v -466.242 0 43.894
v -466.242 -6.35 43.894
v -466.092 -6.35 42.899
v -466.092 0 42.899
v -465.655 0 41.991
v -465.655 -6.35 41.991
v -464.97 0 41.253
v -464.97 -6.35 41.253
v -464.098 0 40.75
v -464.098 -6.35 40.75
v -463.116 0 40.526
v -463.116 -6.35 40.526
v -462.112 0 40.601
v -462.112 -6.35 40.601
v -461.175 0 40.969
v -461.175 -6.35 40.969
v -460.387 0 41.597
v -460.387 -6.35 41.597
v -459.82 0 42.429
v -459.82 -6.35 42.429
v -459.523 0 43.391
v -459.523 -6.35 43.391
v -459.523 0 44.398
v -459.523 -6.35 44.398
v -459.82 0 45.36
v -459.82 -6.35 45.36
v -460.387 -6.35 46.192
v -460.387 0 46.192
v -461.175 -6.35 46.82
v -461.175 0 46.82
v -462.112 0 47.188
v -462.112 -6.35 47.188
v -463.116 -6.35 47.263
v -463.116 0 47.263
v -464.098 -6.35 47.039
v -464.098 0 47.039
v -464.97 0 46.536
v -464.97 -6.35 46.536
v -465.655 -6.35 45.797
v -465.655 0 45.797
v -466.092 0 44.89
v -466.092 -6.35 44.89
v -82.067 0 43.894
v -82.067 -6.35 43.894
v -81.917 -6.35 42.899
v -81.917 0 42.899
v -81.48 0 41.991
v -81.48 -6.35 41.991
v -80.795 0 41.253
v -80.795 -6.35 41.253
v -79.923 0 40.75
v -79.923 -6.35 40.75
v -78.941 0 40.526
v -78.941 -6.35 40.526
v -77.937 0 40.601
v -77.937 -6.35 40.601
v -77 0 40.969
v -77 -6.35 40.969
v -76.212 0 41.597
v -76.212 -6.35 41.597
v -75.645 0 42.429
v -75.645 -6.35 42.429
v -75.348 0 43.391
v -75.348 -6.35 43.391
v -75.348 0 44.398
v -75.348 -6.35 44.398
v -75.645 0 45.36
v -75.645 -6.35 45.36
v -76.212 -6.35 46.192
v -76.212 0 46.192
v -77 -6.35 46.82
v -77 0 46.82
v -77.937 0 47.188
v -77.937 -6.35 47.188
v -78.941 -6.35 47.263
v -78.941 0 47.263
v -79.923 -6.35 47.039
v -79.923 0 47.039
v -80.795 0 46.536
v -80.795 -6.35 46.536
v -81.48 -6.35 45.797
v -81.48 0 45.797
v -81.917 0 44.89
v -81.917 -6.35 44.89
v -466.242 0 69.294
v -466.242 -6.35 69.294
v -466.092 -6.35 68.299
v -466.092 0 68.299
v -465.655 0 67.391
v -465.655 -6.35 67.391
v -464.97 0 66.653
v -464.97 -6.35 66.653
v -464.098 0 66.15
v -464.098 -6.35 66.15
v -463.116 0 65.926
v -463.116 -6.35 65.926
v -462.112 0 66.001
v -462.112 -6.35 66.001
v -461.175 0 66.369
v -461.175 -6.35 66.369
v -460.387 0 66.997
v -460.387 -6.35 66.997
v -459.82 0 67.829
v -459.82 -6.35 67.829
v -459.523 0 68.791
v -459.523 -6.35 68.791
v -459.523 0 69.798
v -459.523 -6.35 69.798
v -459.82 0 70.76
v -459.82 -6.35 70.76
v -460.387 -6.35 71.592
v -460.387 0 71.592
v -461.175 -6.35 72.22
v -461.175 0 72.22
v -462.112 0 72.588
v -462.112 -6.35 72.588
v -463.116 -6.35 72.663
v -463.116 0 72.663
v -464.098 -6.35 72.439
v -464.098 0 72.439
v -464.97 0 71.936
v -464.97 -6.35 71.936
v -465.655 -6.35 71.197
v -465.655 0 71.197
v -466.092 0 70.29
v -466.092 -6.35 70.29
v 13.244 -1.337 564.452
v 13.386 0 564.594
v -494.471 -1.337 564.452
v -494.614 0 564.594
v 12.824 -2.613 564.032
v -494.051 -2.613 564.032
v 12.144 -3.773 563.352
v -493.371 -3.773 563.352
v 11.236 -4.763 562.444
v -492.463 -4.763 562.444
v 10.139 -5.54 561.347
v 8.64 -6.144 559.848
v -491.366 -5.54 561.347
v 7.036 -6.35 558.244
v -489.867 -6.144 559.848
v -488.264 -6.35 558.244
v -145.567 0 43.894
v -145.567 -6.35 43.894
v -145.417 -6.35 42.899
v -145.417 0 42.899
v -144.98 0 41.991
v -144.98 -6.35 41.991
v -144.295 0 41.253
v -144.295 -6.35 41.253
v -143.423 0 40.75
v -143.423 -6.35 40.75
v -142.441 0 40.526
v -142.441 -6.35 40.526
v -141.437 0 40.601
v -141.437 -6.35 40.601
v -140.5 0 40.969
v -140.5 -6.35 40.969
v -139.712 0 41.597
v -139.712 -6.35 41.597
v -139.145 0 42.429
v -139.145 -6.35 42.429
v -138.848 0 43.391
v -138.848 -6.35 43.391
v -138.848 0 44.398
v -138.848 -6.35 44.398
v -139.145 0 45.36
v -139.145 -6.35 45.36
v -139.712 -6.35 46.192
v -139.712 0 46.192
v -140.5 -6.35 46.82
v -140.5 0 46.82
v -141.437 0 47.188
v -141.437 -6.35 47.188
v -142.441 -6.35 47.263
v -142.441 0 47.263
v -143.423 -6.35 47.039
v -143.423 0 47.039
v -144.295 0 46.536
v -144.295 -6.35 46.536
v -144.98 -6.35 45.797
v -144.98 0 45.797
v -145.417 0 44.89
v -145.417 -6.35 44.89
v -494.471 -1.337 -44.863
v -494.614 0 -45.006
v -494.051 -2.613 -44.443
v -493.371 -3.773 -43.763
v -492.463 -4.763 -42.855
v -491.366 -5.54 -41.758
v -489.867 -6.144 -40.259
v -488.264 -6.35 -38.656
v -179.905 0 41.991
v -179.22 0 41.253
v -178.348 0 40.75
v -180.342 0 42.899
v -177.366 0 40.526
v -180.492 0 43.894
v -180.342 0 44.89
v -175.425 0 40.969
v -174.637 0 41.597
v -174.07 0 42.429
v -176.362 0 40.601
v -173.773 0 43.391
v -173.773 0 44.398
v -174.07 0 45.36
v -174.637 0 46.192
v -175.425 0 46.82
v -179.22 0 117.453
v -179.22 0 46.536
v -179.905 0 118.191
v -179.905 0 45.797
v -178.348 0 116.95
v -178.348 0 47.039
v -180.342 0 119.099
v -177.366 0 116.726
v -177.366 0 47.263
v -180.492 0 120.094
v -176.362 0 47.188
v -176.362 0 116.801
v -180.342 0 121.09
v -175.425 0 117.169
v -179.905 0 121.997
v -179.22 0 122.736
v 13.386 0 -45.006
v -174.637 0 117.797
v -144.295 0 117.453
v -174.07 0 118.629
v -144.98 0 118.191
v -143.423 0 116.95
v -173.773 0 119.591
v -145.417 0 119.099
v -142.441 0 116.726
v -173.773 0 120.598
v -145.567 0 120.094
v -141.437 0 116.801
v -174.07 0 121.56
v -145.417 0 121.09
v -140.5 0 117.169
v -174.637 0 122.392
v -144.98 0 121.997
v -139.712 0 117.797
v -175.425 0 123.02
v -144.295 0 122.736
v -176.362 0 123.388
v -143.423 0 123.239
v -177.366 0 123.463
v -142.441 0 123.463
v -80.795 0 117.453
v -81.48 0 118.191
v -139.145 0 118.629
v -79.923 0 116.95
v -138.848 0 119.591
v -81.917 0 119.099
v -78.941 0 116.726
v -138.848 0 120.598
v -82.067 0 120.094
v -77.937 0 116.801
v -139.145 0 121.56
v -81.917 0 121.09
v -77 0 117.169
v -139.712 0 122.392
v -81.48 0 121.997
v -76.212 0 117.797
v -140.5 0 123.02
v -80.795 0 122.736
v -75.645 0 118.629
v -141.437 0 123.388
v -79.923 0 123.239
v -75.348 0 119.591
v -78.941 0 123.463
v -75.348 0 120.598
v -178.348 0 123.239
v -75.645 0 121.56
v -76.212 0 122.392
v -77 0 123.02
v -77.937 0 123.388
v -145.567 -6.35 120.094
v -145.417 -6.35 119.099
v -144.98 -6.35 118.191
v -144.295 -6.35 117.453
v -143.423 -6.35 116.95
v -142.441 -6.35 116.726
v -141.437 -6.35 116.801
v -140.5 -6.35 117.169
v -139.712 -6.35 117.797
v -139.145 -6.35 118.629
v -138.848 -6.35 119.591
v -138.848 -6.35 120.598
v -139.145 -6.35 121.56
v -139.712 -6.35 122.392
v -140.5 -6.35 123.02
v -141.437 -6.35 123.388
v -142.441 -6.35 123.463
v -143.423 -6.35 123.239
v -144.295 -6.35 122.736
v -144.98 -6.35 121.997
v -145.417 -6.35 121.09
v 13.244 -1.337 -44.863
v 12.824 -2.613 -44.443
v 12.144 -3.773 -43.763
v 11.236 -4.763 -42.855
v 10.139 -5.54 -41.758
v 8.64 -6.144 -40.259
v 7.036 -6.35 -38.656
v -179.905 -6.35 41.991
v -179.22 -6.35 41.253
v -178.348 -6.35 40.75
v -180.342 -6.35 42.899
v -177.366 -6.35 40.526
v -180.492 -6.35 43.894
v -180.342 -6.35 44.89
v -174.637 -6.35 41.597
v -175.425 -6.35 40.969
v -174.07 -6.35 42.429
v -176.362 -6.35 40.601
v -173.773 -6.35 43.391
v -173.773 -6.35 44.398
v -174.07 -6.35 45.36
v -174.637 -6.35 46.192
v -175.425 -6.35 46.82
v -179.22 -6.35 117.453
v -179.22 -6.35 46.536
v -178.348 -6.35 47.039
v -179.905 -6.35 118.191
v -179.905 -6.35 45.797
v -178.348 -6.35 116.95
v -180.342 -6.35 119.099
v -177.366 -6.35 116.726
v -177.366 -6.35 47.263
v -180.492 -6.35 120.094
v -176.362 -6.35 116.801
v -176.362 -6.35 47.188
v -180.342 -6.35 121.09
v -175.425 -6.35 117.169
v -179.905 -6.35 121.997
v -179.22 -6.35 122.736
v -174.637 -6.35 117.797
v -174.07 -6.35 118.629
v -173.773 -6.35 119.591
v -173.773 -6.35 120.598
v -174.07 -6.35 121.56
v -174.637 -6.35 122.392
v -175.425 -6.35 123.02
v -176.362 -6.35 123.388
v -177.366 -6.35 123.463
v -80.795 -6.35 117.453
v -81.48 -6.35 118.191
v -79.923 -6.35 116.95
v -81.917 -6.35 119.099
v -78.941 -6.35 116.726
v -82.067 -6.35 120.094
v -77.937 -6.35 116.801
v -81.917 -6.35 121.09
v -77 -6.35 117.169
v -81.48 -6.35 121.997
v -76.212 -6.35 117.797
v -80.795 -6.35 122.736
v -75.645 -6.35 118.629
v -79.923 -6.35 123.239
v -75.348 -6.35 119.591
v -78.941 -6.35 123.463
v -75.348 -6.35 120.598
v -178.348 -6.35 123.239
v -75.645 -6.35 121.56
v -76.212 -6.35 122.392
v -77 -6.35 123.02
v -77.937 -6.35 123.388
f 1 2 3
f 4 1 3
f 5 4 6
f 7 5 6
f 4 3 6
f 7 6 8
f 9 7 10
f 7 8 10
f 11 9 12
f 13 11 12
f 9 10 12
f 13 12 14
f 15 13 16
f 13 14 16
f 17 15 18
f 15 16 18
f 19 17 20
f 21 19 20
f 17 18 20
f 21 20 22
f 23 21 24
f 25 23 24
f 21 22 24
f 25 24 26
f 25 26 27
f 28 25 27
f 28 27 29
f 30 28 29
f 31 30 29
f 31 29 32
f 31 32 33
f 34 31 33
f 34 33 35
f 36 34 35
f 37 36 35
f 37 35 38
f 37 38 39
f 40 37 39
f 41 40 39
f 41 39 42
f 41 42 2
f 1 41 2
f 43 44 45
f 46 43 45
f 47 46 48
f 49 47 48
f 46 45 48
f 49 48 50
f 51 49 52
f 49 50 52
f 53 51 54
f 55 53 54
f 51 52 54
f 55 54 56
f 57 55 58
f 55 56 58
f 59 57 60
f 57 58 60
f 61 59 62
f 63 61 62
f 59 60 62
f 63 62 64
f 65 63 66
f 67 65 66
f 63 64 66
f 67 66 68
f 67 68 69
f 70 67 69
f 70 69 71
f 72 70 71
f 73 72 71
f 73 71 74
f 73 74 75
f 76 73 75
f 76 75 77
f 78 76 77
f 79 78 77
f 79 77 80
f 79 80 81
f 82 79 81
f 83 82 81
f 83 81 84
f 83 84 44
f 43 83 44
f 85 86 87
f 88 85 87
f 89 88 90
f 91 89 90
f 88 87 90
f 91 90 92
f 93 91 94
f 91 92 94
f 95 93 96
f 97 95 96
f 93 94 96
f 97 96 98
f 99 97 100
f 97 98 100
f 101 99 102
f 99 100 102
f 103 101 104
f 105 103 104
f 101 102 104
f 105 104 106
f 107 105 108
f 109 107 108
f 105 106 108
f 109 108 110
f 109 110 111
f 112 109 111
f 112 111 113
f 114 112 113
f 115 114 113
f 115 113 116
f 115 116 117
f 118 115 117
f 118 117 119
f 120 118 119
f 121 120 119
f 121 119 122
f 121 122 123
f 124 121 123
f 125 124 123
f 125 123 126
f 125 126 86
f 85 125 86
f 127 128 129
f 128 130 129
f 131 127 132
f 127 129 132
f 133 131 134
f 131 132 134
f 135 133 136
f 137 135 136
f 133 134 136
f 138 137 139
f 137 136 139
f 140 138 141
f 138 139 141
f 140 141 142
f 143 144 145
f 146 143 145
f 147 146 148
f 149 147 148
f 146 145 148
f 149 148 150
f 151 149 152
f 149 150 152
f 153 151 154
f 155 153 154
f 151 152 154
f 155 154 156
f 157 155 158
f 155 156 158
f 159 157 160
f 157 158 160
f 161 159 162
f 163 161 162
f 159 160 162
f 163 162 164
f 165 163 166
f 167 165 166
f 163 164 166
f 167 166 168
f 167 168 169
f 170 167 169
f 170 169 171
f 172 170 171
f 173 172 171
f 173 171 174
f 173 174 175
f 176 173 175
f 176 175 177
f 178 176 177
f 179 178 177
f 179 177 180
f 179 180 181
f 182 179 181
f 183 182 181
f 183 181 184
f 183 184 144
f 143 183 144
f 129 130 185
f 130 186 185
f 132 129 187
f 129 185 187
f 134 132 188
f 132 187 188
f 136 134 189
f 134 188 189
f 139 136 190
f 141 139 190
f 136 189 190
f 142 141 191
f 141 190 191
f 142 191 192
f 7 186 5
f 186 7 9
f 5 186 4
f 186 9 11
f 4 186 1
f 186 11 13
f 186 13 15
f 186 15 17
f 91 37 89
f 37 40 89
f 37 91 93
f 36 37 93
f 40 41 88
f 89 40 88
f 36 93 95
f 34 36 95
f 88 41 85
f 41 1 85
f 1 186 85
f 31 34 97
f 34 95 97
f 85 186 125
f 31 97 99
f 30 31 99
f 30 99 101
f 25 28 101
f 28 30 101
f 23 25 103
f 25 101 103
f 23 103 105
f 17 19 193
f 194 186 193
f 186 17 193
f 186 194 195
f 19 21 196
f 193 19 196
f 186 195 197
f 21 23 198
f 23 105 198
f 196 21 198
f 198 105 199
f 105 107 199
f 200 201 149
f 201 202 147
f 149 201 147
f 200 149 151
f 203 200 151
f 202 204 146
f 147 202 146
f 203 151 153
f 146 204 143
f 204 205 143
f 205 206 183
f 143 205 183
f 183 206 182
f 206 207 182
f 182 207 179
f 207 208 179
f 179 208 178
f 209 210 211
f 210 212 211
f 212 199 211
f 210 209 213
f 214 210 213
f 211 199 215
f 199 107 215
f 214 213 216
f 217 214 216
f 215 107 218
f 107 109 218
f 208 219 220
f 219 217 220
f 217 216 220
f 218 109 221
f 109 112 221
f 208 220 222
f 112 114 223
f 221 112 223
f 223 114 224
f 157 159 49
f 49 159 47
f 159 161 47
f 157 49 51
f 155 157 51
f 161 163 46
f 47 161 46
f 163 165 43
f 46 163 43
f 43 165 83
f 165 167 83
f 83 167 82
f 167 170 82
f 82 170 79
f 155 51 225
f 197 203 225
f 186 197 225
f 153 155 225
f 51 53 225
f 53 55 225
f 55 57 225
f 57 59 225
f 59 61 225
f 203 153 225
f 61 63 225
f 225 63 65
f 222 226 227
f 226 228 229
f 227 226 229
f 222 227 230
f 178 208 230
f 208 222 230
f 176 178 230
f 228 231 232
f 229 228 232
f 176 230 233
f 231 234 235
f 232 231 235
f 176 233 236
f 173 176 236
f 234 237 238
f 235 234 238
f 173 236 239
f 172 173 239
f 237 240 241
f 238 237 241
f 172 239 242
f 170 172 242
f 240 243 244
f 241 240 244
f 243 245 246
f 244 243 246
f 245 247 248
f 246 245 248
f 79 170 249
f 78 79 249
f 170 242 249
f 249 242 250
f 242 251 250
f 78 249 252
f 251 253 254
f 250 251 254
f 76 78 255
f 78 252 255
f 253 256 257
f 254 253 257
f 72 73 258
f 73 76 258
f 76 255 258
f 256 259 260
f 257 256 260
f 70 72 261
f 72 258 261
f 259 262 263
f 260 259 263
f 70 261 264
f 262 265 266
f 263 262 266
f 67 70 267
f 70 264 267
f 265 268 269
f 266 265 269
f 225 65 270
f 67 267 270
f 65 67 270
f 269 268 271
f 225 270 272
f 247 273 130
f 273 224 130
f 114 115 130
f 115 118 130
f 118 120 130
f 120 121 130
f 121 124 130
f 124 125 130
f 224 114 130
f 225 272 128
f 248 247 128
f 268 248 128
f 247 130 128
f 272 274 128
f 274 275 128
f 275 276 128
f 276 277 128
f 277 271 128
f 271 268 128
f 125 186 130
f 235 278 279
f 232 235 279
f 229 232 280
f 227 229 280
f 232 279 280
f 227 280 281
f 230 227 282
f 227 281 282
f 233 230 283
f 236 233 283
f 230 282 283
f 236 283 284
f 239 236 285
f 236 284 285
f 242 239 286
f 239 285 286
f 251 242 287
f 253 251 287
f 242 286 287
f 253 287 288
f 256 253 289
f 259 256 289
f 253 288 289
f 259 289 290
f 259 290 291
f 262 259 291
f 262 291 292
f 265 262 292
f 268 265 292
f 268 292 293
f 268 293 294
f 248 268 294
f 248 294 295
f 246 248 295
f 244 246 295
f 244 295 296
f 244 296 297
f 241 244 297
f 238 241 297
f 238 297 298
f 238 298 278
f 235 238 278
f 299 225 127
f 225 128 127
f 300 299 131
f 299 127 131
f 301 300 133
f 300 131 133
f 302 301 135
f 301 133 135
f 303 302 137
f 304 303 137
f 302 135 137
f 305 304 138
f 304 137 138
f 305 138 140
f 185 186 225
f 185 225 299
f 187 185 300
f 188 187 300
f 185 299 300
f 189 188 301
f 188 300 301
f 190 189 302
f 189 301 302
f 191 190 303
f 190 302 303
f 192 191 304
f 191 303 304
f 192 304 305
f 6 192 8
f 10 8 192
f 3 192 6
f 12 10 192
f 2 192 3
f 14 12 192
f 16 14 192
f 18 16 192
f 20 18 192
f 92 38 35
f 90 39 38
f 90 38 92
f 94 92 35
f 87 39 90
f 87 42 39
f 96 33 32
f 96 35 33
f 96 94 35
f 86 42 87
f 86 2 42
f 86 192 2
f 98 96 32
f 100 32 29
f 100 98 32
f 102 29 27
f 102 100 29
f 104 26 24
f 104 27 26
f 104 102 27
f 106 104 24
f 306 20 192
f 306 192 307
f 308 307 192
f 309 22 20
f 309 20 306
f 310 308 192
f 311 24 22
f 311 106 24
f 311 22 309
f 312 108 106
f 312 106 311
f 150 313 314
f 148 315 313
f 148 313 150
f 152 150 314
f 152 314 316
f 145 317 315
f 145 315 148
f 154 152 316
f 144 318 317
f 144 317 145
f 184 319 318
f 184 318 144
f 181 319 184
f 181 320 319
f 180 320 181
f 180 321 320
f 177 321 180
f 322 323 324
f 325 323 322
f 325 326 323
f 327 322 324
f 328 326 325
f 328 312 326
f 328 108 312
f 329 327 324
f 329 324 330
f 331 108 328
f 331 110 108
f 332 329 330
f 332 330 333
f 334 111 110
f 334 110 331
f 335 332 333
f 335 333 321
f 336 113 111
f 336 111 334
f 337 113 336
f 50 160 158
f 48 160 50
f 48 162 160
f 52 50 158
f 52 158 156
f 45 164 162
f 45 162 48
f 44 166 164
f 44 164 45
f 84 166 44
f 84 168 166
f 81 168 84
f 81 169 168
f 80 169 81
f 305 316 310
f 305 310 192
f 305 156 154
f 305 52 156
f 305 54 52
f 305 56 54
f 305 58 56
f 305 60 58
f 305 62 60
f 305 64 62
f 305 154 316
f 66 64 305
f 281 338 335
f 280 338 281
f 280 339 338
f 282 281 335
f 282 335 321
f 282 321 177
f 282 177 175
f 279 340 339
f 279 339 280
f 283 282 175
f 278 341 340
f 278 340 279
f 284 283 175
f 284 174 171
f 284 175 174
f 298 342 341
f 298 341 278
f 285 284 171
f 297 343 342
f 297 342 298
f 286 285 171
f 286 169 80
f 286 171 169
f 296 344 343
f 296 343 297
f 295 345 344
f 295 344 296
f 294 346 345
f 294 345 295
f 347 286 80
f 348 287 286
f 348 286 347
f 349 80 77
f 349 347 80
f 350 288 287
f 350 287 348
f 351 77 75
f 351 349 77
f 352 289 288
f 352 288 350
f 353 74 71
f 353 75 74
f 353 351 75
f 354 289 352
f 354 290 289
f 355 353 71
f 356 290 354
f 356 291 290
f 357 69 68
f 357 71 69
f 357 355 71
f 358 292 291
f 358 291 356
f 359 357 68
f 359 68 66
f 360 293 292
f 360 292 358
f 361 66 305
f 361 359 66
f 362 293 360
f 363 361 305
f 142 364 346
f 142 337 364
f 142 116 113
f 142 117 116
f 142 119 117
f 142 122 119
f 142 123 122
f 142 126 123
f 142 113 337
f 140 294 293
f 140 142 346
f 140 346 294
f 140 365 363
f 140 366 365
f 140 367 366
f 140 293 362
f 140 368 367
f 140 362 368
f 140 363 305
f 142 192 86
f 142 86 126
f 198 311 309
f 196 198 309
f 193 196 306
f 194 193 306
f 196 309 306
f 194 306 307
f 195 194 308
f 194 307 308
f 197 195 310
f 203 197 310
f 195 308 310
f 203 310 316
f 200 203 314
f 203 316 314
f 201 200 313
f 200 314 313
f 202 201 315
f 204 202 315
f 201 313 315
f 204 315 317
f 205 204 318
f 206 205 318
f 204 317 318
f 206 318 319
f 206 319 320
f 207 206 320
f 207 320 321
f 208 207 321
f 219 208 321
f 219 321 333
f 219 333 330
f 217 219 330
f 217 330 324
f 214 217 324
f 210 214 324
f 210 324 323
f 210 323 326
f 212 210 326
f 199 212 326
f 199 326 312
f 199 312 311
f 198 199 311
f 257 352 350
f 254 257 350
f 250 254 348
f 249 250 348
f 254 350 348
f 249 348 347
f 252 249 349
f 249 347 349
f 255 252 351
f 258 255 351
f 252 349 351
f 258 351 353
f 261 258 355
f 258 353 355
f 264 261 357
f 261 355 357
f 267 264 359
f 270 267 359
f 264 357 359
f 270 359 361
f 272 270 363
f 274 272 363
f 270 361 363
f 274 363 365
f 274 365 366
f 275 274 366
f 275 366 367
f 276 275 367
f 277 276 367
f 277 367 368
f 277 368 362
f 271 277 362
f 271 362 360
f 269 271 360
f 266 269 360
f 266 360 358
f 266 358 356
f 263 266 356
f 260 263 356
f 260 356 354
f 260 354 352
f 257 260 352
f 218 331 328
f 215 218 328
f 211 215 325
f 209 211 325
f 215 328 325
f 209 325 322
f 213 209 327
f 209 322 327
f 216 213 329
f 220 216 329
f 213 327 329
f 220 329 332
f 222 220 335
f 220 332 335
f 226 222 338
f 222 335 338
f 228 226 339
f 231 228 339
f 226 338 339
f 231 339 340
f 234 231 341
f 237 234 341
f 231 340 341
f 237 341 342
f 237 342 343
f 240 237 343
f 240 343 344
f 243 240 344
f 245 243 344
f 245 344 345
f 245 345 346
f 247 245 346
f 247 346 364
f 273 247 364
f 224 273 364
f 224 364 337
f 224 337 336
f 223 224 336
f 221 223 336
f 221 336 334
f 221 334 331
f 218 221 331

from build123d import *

# Parameters (mm, degrees)
F1_DEPTH = 6.35
F2_R     = 6.34999
F3_D     = 6.7564


# Not quite as in the source:
# - a fillet or chamfer is up to 0.001 mm smaller than in the source, because OpenCascade refuses the exact size


with BuildPart() as f1:
    # F0 (on Front) → F1 (new body)
    with BuildSketch(Plane.XZ):
        Polygon((-494.6137029603, 259.7943879247), (-494.6137029603, -45.0056120753), (13.3862970397, -45.0056120753), (13.3862970397, 259.7943879247), (13.3862970397, 564.5943879247), (-494.6137029603, 564.5943879247), align=None)
    extrude(amount=F1_DEPTH)

    # F2 (radius 6.35 in the source; OpenCascade refuses exactly that, so slightly less here)
    f2_edges = [f1.edges().sort_by_distance(p)[0] for p in [
        (-494.613703, -6.35, 259.794388),
        (-240.613703, -6.35, -45.005612),
        (13.386297, -6.35, 259.794388),
        (-240.613703, -6.35, 564.594388),
    ]]
    fillet(f2_edges, radius=F2_R)

    # F3 (through all)
    with Locations(Plane(origin=(0, 0, 0), x_dir=(1, 0, 0), z_dir=(0, 1, 0))):
        with Locations((-177.1137029603, -120.0943879247), (-142.1887029603, -120.0943879247), (-78.6887029603, -120.0943879247), (-78.6887029603, -43.8943879247), (-142.1887029603, -43.8943879247), (-177.1137029603, -43.8943879247), (-462.8637029603, -69.2943879247), (-462.8637029603, -43.8943879247)):
            Hole(F3_D / 2)


solid = f1.part
